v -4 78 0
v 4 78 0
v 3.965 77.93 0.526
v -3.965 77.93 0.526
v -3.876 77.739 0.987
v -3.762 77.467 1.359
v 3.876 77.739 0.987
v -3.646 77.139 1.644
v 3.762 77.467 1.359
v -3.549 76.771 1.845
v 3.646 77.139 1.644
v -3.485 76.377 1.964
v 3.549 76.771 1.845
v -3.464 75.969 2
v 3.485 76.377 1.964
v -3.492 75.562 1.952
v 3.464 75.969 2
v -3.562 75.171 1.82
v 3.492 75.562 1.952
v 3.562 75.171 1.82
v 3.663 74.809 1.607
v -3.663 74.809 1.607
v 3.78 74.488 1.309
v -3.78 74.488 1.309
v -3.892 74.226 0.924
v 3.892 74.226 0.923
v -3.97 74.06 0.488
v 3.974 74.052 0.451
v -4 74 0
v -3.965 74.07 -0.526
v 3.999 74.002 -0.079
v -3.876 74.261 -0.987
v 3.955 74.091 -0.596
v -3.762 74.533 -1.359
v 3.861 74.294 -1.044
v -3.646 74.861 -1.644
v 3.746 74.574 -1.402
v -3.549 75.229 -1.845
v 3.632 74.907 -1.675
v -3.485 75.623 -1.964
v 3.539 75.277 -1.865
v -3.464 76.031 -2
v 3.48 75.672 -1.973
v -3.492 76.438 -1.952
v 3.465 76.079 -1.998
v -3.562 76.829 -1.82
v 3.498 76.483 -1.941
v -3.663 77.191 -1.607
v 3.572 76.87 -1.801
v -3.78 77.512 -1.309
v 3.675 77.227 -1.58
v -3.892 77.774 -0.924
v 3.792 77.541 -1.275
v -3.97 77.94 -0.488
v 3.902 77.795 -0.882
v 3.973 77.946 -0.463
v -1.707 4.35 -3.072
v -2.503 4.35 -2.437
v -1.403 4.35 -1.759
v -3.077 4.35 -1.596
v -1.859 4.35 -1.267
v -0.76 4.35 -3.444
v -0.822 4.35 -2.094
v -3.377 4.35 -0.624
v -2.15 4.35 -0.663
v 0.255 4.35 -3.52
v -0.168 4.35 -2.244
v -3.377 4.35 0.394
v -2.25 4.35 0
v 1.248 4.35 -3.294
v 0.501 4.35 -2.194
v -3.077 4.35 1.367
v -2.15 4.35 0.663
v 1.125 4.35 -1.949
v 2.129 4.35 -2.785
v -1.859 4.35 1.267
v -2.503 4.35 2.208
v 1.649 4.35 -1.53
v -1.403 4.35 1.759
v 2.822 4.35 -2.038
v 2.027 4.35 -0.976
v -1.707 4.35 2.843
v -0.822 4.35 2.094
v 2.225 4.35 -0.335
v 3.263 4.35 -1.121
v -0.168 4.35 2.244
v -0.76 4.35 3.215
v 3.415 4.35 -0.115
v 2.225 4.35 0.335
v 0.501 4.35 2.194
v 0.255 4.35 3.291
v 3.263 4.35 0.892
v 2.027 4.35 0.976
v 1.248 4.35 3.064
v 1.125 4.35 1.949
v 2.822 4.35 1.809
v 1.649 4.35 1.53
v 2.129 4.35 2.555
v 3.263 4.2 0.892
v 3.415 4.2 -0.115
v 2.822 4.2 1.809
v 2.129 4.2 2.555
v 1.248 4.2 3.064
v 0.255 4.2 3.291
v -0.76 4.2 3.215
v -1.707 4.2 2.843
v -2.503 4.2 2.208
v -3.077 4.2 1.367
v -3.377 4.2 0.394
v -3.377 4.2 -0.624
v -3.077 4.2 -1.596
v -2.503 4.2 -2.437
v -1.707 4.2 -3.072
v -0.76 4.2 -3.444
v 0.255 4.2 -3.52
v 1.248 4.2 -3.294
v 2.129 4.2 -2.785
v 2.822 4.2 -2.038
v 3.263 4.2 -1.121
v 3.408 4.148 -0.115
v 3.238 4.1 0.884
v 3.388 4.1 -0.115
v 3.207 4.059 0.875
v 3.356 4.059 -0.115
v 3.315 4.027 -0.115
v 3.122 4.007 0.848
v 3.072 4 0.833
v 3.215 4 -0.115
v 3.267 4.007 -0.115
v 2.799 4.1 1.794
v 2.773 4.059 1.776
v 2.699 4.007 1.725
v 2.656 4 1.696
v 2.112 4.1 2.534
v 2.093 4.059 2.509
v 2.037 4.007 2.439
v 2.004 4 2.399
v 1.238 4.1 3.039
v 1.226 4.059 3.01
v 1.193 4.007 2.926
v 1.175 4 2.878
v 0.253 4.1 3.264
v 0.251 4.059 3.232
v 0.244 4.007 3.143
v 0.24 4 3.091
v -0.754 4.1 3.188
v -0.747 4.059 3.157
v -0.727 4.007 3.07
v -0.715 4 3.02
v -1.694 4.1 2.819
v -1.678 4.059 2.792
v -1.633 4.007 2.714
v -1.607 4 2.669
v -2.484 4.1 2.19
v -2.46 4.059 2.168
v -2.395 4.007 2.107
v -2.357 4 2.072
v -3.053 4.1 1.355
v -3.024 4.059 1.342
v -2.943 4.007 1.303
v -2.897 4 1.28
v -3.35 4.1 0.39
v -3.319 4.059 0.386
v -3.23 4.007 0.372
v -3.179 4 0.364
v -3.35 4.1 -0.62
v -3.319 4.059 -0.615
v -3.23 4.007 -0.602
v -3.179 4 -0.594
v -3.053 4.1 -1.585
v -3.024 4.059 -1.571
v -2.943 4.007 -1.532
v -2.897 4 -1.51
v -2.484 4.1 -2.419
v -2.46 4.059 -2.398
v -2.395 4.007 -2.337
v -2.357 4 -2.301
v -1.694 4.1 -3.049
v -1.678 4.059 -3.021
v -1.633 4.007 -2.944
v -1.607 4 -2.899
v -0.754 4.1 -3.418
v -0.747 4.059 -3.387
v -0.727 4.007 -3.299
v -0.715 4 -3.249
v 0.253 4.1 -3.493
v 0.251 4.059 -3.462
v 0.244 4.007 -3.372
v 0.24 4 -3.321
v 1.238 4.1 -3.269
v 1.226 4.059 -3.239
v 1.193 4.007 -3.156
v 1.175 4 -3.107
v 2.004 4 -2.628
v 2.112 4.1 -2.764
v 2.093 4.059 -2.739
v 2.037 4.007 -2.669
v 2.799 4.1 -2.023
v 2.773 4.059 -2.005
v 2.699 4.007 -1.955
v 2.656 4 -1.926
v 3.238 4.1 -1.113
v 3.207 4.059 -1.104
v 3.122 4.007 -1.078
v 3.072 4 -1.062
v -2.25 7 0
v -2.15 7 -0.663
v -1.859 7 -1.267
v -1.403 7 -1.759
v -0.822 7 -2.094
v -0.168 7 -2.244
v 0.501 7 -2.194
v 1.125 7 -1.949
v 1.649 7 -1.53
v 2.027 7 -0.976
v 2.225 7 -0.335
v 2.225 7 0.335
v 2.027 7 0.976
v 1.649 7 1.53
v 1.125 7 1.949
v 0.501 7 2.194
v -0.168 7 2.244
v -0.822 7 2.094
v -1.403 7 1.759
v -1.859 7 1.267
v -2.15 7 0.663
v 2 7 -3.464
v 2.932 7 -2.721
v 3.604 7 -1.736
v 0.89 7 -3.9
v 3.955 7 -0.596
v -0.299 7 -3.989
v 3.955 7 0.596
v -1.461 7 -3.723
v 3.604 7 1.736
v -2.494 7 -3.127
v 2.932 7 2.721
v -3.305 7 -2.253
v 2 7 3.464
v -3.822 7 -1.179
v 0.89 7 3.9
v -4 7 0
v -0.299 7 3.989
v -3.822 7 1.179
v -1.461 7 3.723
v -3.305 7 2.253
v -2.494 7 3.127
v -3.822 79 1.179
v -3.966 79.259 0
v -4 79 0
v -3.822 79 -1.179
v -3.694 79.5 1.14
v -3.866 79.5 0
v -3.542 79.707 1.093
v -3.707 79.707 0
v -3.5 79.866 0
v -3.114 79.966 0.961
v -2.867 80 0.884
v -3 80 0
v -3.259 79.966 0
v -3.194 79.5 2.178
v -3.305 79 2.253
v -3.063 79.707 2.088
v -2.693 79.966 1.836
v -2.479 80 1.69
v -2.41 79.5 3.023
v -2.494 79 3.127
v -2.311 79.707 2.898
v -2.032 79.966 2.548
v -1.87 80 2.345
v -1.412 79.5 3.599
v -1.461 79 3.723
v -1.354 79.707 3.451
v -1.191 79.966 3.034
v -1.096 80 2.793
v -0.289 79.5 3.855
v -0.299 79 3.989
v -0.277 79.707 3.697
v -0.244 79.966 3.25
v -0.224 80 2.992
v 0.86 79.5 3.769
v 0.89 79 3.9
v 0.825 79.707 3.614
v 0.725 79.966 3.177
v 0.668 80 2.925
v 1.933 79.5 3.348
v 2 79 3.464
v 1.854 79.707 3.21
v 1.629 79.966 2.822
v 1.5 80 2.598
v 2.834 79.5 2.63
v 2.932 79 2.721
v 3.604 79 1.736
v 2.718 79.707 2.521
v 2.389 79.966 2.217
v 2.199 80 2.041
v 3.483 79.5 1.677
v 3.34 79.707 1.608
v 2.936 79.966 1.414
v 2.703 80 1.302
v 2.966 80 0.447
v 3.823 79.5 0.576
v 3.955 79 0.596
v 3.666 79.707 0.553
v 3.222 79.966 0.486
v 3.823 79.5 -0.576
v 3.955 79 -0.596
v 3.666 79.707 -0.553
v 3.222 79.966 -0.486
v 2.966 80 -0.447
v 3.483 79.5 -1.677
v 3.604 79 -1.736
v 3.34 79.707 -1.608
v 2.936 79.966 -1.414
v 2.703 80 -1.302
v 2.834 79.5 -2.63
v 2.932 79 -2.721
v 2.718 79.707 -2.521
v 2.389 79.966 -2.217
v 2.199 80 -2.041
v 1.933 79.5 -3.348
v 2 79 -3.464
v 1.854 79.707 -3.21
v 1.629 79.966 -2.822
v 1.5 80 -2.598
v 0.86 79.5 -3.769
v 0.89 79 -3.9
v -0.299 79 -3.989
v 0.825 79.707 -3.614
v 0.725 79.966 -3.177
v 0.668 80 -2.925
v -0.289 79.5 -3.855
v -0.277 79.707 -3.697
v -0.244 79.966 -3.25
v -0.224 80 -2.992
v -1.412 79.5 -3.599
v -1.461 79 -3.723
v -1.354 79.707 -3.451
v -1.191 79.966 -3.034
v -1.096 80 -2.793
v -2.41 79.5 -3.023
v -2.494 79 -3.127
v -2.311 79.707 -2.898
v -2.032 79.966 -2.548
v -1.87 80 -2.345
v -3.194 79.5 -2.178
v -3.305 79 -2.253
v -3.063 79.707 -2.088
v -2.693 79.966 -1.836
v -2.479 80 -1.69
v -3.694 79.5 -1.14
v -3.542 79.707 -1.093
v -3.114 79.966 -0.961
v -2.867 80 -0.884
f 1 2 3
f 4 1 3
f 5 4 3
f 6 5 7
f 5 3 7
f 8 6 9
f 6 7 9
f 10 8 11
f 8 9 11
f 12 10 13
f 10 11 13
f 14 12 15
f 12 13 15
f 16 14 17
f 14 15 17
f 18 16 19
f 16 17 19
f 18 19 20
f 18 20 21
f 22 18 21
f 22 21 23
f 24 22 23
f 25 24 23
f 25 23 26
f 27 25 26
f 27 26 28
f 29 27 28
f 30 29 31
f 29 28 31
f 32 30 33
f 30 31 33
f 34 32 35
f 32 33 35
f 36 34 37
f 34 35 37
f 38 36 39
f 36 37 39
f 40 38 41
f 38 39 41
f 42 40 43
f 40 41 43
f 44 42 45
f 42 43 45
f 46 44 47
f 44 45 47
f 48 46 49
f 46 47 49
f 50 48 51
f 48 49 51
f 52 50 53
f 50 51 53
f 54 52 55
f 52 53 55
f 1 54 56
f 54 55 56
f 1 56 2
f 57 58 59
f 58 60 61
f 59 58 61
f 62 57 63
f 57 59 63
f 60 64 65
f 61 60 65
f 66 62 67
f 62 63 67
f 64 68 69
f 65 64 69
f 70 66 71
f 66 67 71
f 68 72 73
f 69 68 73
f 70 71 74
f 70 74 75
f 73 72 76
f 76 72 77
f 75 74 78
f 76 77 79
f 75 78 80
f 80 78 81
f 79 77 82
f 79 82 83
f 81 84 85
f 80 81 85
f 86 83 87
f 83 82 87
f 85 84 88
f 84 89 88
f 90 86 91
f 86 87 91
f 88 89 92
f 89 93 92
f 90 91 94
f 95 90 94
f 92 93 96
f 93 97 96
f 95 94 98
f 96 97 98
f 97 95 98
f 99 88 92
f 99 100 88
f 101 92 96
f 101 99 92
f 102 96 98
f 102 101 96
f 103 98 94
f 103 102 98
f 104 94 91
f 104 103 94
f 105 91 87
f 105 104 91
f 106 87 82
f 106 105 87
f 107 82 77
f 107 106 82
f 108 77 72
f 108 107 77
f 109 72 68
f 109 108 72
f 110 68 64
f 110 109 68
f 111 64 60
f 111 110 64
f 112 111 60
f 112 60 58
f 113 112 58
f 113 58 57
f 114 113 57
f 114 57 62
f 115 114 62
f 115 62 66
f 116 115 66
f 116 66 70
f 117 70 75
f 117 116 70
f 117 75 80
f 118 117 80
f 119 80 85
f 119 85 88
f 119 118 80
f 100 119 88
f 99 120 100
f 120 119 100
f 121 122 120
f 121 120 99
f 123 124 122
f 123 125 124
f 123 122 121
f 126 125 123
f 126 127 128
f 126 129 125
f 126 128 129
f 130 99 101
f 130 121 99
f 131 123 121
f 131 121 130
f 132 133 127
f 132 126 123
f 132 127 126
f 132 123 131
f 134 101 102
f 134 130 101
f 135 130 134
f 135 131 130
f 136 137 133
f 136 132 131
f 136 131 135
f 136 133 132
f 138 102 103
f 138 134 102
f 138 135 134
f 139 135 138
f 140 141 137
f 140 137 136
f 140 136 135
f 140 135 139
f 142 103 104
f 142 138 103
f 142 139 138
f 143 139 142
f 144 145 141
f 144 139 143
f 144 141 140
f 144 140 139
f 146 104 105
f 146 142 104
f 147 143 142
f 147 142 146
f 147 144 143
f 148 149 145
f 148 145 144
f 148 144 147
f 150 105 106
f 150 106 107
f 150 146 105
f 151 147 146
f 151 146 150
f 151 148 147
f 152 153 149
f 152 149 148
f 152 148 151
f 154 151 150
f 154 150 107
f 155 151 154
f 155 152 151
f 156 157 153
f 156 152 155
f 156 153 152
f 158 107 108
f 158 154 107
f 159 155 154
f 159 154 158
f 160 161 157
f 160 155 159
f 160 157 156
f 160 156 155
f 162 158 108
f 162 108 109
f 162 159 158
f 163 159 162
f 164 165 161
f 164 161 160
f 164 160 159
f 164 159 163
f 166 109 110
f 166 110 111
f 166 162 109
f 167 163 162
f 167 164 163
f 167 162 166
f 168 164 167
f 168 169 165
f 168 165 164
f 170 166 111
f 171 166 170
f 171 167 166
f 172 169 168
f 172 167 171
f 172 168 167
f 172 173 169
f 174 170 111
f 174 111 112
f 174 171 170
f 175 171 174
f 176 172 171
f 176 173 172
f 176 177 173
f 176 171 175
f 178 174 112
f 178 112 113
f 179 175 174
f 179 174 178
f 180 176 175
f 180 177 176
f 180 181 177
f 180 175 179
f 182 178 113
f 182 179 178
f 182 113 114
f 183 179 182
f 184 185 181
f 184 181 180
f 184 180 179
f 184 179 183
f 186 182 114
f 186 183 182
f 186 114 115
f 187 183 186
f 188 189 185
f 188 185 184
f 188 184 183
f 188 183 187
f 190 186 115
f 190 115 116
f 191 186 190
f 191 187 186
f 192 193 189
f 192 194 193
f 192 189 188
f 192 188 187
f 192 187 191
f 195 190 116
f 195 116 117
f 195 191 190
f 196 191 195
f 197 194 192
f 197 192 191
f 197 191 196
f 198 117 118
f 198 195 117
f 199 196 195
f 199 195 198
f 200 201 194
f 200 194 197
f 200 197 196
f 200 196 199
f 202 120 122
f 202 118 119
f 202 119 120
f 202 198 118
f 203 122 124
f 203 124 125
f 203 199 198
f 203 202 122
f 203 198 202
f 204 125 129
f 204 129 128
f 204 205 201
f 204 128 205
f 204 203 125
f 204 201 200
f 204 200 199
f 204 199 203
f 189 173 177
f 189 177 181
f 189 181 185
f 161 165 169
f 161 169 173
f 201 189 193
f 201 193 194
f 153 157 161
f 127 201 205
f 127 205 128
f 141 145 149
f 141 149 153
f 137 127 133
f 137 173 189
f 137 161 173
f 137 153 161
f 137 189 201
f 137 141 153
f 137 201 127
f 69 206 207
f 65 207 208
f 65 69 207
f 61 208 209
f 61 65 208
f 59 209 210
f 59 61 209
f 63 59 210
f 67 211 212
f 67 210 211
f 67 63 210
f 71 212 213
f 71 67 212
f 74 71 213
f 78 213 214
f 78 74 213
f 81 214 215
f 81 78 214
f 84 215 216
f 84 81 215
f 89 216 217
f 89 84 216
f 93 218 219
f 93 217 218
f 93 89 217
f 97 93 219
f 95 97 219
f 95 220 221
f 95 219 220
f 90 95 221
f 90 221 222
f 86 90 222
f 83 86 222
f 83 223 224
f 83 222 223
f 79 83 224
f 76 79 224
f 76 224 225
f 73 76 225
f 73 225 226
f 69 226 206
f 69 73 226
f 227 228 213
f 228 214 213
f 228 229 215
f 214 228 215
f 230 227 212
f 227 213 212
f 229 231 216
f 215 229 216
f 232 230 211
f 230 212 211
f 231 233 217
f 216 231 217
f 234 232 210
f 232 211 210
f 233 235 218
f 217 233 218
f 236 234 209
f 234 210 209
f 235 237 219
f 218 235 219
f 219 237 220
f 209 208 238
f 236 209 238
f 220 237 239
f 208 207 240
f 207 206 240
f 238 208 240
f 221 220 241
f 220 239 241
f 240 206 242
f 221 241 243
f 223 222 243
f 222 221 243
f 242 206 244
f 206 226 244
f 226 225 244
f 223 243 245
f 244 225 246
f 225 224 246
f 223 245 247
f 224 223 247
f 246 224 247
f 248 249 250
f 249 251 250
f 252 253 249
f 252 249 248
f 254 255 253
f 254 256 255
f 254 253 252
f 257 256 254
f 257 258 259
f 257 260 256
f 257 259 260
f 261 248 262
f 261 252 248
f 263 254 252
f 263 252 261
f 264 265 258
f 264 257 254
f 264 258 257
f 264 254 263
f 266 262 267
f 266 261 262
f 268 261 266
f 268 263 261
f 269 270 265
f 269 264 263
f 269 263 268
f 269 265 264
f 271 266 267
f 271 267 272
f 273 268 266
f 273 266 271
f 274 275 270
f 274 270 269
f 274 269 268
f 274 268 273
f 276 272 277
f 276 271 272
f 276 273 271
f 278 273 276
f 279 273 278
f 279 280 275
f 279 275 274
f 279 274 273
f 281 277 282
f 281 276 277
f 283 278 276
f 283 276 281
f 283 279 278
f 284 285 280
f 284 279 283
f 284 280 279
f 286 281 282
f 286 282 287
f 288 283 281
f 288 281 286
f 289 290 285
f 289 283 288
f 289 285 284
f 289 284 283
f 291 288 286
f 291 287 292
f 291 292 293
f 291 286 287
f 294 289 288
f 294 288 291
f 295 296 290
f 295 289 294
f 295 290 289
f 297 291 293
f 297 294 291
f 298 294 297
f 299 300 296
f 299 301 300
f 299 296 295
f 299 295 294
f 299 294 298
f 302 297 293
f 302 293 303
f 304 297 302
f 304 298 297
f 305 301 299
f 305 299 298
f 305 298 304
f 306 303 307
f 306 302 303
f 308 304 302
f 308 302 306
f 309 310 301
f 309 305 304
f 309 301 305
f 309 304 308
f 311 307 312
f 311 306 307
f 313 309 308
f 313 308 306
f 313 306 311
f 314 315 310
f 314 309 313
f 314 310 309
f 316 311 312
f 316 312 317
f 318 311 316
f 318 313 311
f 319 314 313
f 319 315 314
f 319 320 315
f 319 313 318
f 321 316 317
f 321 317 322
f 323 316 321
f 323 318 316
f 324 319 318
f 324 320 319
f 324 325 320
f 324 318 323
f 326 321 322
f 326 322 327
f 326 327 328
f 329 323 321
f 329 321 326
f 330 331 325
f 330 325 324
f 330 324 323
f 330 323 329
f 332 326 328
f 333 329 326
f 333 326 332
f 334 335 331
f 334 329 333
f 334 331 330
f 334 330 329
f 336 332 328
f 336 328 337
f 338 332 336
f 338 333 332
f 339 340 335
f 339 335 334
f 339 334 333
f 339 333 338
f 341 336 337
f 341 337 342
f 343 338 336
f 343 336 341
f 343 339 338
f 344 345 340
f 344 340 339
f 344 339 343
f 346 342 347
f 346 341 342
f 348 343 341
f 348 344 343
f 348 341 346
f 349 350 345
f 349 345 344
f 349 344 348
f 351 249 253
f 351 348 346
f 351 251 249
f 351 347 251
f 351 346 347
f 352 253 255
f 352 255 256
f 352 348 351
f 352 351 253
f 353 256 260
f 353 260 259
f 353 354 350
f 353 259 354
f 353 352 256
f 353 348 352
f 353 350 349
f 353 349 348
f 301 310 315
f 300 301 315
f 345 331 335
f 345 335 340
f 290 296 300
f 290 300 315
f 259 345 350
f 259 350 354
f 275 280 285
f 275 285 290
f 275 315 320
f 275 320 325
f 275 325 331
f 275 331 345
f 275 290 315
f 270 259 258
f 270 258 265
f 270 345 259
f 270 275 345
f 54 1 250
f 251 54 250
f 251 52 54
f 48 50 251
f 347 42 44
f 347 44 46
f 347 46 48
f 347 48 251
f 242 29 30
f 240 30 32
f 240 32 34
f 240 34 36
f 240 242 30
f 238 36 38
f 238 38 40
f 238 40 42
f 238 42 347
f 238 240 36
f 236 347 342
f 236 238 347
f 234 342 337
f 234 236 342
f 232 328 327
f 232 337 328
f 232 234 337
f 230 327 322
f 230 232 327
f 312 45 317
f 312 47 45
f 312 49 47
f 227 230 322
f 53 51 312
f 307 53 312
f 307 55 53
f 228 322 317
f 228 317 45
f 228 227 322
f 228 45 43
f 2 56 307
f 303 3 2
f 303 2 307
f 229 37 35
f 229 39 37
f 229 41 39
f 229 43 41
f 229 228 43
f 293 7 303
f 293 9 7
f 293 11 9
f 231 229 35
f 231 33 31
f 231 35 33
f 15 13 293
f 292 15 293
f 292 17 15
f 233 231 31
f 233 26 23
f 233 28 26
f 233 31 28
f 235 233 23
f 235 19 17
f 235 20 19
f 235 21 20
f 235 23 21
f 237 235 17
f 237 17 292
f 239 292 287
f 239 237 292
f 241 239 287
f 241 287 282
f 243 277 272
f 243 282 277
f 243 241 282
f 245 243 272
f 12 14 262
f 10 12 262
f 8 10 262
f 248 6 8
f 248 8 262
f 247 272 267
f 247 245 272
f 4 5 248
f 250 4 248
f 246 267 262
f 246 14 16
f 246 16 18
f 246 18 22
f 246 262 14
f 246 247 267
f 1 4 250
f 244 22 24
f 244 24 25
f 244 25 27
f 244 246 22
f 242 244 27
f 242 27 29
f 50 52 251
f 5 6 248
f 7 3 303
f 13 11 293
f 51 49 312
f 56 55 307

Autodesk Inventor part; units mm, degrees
ref_plane "YZ Plane" through (0, 0, 0) normal (1, 0, 0) x (0, 1, 0)
ref_plane "XY Plane" through (0, 0, 0) normal (0, 0, 1) x (1, 0, 0)
sketch "Sketch1" plane through (0, 0, 0) normal (0, 1, 0) x (-1, 0, 0)
  circle A0 centre (0, 0) radius 4
  circle A1 centre (0, 0) radius 2.25
  dimension "d0" = 8
  dimension "d3" = 4.5
extrude "Extrusion1" add sketch "Sketch1" along normal blind 80 contours A0 | A1
extrude "Extrusion2" cut sketch "Sketch1" along normal blind 7
sketch "Sketch2" plane through (0, 0, 0) normal (1, 0, 0) x (0, 1, 0)
  line L0 (80, -4) -> (80, 4) projected
  circle A0 centre (76, 0) radius 2
  point P0 (0, 0)
  dimension "d6" = 4
  dimension "d7" = 4
extrude "Extrusion3" cut sketch "Sketch2" along normal through all both and the other way through all
thread "Thread1" size "M8x1.25" class "6g" standard "ANSI Metric M Profile" length 65
fillet "Fillet1" radius 1 2 edges at (4, 80, 0) (2.25, 0, 0)
ref_plane "Work Plane1" through (0, 73, 0) normal (0, 1, 0) x (-1, 0, 0)
ref_plane "Work Plane2" through (0, 7, 0) normal (0, 1, 0) x (-1, 0, 0)
extrude "Extrusion4" cut sketch "Sketch1" along normal blind 4 contours A1
sketch "Sketch3" plane through (0, 4, 0) normal (0, -1, 0) x (1, 0, 0)
  circle A0 centre (0, -0.1147) radius 3.4149
  point P0 (0, 0)
extrude "Extrusion5" add sketch "Sketch3" against normal blind 0.35
fillet "Fillet3" radius 0.2 1 edges at (-3.4149, 4, -0.1147)
properties part number "clampScrew"
